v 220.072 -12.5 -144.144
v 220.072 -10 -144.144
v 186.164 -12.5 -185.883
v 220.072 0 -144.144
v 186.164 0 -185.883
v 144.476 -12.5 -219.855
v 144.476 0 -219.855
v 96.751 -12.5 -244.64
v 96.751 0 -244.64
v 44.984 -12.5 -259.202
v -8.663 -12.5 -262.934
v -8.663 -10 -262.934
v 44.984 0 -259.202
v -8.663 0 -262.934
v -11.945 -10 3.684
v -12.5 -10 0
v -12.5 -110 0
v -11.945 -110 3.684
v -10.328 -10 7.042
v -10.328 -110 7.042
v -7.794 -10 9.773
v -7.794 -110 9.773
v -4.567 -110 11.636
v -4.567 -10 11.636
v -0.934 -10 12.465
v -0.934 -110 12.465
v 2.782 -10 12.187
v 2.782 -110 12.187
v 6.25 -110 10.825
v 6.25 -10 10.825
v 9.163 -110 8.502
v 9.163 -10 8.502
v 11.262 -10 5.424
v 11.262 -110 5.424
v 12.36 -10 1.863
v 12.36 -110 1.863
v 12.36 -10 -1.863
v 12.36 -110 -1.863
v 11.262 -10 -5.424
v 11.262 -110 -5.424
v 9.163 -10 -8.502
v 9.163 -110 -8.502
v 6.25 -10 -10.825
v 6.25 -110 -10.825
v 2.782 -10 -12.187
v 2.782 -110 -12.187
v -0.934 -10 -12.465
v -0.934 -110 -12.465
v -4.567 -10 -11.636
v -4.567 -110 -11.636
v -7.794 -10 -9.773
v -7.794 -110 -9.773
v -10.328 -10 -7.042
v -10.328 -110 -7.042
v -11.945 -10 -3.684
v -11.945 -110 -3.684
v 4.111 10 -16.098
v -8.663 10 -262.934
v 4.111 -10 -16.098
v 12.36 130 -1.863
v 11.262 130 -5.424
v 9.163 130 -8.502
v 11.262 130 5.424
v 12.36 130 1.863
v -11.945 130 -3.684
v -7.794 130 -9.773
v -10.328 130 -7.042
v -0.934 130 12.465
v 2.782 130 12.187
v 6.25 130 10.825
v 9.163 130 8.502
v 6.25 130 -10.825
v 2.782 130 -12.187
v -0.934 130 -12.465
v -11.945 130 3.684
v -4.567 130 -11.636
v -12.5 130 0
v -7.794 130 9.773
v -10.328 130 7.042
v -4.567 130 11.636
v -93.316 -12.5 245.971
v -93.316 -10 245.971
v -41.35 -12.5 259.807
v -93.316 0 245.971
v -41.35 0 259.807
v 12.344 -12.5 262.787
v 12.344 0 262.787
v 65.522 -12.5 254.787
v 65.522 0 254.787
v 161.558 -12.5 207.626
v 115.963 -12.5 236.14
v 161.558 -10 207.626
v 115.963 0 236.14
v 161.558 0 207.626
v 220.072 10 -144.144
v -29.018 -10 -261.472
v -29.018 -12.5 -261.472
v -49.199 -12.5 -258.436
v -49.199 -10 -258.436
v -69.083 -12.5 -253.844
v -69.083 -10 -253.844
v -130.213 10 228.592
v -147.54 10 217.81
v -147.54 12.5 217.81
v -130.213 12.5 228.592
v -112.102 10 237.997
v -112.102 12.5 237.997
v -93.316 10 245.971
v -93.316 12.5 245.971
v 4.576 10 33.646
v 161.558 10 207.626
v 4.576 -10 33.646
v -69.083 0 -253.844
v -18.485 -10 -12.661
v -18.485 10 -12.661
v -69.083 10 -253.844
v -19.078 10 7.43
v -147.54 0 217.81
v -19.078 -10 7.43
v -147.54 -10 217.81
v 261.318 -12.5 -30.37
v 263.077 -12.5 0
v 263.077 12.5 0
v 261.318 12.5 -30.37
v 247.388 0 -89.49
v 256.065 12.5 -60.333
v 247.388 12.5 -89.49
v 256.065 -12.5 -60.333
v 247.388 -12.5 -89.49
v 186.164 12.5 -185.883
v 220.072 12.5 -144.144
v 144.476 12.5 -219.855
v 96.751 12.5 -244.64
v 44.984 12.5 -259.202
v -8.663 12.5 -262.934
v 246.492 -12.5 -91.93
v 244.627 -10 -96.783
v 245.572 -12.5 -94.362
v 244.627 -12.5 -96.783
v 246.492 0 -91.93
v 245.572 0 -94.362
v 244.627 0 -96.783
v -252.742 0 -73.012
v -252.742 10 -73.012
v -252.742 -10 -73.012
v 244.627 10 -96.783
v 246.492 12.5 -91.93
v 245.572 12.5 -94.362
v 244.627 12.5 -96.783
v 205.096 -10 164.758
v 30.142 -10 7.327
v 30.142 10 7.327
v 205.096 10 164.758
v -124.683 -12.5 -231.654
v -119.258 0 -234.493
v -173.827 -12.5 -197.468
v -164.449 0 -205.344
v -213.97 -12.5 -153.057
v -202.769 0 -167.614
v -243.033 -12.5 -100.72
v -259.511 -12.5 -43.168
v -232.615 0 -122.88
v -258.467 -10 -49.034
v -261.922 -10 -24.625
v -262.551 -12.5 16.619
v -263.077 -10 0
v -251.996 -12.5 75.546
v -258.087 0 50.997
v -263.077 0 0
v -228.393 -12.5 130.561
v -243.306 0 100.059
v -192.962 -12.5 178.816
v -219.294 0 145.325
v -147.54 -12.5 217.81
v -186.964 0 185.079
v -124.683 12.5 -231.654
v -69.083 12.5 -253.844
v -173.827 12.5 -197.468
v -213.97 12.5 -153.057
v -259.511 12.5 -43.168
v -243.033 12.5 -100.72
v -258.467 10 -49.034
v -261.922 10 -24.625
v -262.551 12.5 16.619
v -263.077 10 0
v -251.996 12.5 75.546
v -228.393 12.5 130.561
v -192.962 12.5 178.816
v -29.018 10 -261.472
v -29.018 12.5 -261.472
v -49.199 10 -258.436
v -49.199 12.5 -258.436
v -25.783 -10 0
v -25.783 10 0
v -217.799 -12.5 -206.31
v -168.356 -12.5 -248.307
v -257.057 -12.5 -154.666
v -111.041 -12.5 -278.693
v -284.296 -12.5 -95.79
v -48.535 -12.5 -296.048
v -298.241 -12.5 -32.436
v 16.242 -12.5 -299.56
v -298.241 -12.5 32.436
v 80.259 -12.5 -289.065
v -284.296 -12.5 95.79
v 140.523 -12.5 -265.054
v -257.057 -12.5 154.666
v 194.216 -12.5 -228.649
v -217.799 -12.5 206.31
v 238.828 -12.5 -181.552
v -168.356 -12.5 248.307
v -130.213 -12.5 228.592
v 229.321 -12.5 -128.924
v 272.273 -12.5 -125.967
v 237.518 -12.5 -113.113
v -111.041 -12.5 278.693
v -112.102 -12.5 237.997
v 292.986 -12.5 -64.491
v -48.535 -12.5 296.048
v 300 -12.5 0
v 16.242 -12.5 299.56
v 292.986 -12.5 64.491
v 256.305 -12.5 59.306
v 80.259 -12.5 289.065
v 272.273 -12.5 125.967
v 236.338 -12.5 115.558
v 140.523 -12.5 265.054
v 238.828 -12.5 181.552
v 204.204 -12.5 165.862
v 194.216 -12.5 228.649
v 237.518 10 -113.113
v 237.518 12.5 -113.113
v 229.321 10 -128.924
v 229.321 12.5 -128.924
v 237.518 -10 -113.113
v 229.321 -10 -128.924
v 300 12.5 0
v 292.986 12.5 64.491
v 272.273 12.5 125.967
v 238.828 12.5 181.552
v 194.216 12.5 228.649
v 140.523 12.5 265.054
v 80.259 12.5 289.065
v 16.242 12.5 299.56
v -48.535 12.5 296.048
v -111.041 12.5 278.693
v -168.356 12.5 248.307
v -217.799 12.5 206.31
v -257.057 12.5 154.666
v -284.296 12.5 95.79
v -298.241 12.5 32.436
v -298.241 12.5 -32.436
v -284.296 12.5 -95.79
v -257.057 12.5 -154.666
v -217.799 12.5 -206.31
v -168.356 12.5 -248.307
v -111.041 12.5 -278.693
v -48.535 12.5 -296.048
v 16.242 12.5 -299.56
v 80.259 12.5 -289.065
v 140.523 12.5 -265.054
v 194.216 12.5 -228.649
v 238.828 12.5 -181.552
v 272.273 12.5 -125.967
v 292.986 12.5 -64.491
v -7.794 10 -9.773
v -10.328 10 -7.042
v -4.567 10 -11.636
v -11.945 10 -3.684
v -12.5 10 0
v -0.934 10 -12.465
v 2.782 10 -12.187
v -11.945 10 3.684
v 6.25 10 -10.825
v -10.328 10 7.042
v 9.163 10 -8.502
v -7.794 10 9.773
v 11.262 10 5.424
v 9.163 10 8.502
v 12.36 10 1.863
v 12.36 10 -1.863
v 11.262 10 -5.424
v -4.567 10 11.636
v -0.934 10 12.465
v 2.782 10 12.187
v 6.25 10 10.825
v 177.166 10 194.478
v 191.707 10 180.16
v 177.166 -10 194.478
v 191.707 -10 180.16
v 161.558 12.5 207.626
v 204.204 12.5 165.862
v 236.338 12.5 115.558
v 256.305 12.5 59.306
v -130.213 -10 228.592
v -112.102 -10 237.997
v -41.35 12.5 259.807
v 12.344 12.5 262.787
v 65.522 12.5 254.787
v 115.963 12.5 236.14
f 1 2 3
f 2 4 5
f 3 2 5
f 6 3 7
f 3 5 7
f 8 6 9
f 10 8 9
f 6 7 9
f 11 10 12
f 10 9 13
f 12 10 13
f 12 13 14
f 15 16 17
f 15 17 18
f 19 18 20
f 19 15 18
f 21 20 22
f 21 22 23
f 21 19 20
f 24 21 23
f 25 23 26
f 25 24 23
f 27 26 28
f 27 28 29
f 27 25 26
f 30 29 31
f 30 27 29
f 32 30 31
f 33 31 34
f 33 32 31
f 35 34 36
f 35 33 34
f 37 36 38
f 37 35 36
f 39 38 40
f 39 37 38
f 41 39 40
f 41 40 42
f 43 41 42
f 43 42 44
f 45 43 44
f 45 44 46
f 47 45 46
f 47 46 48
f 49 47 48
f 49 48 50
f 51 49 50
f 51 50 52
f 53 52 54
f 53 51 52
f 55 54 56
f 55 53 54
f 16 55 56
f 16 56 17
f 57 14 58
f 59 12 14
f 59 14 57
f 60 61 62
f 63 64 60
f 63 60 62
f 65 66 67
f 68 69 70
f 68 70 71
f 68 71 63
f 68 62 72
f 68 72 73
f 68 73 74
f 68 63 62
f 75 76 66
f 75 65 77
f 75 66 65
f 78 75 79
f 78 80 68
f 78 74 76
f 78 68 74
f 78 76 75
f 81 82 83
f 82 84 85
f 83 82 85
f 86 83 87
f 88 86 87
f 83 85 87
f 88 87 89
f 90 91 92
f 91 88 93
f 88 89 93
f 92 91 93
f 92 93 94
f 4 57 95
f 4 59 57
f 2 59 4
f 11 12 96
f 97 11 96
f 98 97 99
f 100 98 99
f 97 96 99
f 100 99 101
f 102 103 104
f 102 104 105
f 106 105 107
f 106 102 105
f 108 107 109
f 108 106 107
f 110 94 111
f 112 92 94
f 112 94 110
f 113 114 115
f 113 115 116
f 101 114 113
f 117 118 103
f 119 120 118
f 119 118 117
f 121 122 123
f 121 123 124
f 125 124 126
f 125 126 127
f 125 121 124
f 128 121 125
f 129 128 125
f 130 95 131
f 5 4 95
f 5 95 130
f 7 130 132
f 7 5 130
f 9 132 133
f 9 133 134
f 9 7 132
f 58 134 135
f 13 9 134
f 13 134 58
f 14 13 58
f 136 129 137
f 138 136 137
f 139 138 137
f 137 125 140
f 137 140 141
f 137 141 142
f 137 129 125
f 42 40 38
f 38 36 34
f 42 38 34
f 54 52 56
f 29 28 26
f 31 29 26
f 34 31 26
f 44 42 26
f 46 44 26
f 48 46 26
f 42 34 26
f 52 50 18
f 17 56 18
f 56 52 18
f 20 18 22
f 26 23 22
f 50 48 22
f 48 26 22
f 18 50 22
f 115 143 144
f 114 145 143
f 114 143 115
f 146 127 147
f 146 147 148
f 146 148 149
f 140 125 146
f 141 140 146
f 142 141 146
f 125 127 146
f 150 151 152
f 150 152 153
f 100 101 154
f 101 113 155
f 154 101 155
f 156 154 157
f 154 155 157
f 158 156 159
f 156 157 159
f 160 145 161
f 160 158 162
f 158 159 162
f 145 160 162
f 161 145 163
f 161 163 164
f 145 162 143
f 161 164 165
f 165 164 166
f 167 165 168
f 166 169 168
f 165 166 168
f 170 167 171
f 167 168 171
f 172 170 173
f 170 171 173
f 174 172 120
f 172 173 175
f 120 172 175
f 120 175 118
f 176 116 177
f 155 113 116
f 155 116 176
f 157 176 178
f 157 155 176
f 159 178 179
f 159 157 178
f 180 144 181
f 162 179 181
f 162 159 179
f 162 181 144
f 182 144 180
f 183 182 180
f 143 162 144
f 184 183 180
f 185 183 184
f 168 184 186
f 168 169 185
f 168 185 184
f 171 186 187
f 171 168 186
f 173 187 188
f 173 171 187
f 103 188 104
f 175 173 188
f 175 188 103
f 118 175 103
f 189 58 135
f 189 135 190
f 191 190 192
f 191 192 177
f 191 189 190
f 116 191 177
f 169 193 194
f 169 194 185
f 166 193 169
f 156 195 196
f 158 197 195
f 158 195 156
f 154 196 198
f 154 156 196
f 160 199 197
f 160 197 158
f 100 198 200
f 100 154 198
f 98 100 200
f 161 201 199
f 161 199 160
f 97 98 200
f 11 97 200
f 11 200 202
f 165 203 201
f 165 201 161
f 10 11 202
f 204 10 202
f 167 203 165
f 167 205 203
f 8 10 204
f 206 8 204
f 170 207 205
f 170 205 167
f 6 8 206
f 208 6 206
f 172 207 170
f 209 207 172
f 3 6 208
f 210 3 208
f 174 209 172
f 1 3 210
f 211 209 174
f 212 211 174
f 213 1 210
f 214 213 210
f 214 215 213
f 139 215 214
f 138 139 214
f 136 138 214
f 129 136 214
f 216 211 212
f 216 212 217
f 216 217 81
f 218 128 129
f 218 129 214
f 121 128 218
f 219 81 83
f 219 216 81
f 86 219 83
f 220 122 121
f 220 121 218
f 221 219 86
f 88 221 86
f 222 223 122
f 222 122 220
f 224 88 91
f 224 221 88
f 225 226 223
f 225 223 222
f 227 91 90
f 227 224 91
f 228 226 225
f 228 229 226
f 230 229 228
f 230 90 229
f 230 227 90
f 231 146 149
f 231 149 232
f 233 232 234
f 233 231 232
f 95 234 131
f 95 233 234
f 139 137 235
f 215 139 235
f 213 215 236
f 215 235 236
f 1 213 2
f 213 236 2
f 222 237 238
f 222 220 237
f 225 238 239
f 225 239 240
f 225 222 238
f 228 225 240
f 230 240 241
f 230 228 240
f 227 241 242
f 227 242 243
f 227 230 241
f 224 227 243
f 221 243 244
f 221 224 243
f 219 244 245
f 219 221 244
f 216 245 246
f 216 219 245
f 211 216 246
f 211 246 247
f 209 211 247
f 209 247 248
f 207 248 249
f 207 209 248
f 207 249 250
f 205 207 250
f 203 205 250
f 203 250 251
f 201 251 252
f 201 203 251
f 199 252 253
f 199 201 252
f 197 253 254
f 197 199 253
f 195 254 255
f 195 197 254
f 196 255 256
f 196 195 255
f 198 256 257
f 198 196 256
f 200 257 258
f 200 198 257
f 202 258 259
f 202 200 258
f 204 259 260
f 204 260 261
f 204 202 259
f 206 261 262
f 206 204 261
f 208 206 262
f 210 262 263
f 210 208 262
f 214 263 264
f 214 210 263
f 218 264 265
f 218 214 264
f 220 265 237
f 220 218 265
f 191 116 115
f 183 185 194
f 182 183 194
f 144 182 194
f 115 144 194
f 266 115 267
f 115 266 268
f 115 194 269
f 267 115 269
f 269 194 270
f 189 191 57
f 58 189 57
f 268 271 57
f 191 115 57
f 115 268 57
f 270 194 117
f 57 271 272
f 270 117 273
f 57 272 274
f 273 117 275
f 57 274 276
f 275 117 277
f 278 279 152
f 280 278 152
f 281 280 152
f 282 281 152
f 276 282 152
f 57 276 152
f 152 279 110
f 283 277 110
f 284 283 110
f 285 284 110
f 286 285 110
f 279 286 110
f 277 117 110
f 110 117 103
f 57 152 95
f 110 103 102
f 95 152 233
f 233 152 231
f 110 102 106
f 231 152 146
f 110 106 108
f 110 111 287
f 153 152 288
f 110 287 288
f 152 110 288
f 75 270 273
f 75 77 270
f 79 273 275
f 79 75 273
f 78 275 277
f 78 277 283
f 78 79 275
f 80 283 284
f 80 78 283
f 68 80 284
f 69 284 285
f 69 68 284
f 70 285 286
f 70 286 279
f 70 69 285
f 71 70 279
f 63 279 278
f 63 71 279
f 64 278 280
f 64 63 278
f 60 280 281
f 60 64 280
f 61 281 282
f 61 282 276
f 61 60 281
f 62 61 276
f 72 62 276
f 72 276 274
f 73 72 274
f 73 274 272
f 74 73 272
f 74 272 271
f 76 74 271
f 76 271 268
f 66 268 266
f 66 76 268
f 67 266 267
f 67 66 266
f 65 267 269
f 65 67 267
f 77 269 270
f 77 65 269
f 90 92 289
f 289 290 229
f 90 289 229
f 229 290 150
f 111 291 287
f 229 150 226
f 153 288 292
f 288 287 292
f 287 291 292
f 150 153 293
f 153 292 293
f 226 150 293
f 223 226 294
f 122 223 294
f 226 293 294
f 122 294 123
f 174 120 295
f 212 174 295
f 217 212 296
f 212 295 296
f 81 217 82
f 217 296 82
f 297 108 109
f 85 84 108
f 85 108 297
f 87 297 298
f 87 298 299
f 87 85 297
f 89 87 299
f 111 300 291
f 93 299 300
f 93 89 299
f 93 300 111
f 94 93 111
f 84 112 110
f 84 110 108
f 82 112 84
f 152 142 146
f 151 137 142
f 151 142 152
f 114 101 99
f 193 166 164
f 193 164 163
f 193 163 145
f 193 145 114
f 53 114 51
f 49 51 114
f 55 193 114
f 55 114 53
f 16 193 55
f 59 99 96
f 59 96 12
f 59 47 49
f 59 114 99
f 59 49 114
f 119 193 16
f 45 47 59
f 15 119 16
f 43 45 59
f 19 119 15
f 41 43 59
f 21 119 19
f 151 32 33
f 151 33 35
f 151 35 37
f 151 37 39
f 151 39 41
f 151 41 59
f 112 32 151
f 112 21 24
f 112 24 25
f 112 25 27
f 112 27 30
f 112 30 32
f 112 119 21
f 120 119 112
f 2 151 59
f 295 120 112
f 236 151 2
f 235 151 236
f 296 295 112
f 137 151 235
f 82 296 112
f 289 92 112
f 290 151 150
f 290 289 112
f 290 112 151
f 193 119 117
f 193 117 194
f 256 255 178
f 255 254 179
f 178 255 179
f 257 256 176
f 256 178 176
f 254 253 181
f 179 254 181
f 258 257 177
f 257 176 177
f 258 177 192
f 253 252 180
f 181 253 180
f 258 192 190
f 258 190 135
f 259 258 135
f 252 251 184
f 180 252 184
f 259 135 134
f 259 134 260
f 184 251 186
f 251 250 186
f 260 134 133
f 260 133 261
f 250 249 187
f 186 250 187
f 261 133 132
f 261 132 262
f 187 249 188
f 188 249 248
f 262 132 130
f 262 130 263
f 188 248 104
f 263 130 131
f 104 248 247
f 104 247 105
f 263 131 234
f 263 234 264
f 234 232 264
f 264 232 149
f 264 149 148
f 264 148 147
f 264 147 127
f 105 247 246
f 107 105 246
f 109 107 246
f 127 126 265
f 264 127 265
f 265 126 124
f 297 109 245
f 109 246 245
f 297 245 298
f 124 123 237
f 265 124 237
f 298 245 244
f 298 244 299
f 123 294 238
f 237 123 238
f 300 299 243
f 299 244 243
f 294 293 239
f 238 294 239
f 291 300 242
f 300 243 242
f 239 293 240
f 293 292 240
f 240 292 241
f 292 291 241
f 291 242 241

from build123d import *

# Parameters (mm, degrees)
F0_R     = 300
F1_DEPTH = 12.5
F2_DEPTH = 10
F3_R     = 12.5
F4_DEPTH = 120


with BuildPart() as f1:
    # F0 (on Front) → F1 (new body, symmetric)
    with BuildSketch(Plane.XZ):
        Circle(F0_R)
        with BuildLine():
            ThreePointArc((205.0956009639, 164.7581922724), (248.1586056274, 87.3314027639), (263.0769230769, 0))
            ThreePointArc((263.0769230769, 0), (259.1250629437, -45.4276260667), (247.3882097841, -89.4904526497))
            Line((247.3882097841, -89.4904526497), (253.5845122853, -126.7404960598))
            Line((253.5845122853, -126.7404960598), (220.0723785431, -144.1444263855))
            ThreePointArc((220.0723785431, -144.1444263855), (121.2485164836, -233.4700509833), (-8.6633171075, -262.9342396728))
            Line((-8.6633171075, -262.9342396728), (-42.1754508497, -280.3381699985))
            Line((-42.1754508497, -280.3381699985), (-69.0833910393, -253.8443470675))
            ThreePointArc((-69.0833910393, -253.8443470675), (-184.5753612112, -187.4604051243), (-252.7424342118, -73.0118442742))
            Line((-252.7424342118, -73.0118442742), (-279.6503744013, -46.5180213432))
            Line((-279.6503744013, -46.5180213432), (-263.0769230769, 0))
            ThreePointArc((-263.0769230769, 0), (-232.4046711792, 123.2782879087), (-147.5400976348, 217.8104383301))
            Line((-147.5400976348, 217.8104383301), (-130.6579854969, 251.588451719))
            Line((-130.6579854969, 251.588451719), (-93.3163262043, 245.9705891349))
            ThreePointArc((-93.3163262043, 245.9705891349), (39.138142442, 260.1493287745), (161.55763917, 207.6260982667))
            Line((161.55763917, 207.6260982667), (198.8992984626, 202.0082356825))
            Line((198.8992984626, 202.0082356825), (205.0956009639, 164.7581922724))
        make_face(mode=Mode.SUBTRACT)
        with BuildLine():
            ThreePointArc((-147.5400976348, 217.8104383301), (-121.2485164836, 233.4700509833), (-93.3163262043, 245.9705891349))
            Line((-93.3163262043, 245.9705891349), (-130.6579854969, 251.588451719))
            Line((-130.6579854969, 251.588451719), (-147.5400976348, 217.8104383301))
        make_face()
        with BuildLine():
            ThreePointArc((-252.7424342118, -73.0118442742), (-260.4804881167, -36.8698083275), (-263.0769230769, 0))
            Line((-263.0769230769, 0), (-279.6503744013, -46.5180213432))
            Line((-279.6503744013, -46.5180213432), (-252.7424342118, -73.0118442742))
        make_face()
        with BuildLine():
            Line((-42.1754508497, -280.3381699985), (-8.6633171075, -262.9342396728))
            ThreePointArc((-8.6633171075, -262.9342396728), (-39.138142442, -260.1493287745), (-69.0833910393, -253.8443470675))
            Line((-69.0833910393, -253.8443470675), (-42.1754508497, -280.3381699985))
        make_face()
        with BuildLine():
            Line((253.5845122853, -126.7404960598), (247.3882097841, -89.4904526497))
            ThreePointArc((247.3882097841, -89.4904526497), (246.0347091348, -93.1471382093), (244.6271617936, -96.7833620434))
            ThreePointArc((244.6271617936, -96.7833620434), (233.553384264, -121.0879191102), (220.0723785431, -144.1444263855))
            Line((220.0723785431, -144.1444263855), (253.5845122853, -126.7404960598))
        make_face()
        with BuildLine():
            ThreePointArc((161.55763917, 207.6260982667), (184.5753612112, 187.4604051243), (205.0956009639, 164.7581922724))
            Line((205.0956009639, 164.7581922724), (198.8992984626, 202.0082356825))
            Line((198.8992984626, 202.0082356825), (161.55763917, 207.6260982667))
        make_face()
    extrude(amount=F1_DEPTH, both=True)

    # F0 (on Front) → F2 (join, symmetric)
    with BuildSketch(Plane.XZ):
        with BuildLine():
            Line((244.6271617936, -96.7833620434), (30.1419629049, 7.3265620085))
            Line((30.1419629049, 7.3265620085), (12.8380831788, 15.7257691026))
            Line((12.8380831788, 15.7257691026), (4.5759868907, 33.6459373179))
            Line((4.5759868907, 33.6459373179), (-93.3163262043, 245.9705891349))
            ThreePointArc((-93.3163262043, 245.9705891349), (-121.2485164836, 233.4700509833), (-147.5400976348, 217.8104383301))
            Line((-147.5400976348, 217.8104383301), (-19.0782173139, 7.4303752131))
            Line((-19.0782173139, 7.4303752131), (-25.7826172389, 0))
            Line((-25.7826172389, 0), (-263.0769230769, 0))
            ThreePointArc((-263.0769230769, 0), (-260.4804881167, -36.8698083275), (-252.7424342118, -73.0118442742))
            Line((-252.7424342118, -73.0118442742), (-18.4854909648, -12.6607832838))
            Line((-18.4854909649, -12.6607832838), (-69.0833910393, -253.8443470675))
            ThreePointArc((-69.0833910393, -253.8443470675), (-39.138142442, -260.1493287745), (-8.6633171075, -262.9342396728))
            Line((-8.6633171075, -262.9342396728), (4.1106084022, -16.0976926844))
            Line((4.1106084022, -16.0976926844), (220.0723785431, -144.1444263855))
            ThreePointArc((220.0723785431, -144.1444263855), (233.553384264, -121.0879191102), (244.6271617936, -96.7833620434))
        make_face()
        with BuildLine():
            Line((30.1419629049, 7.3265620085), (205.0956009639, 164.7581922724))
            ThreePointArc((205.0956009639, 164.7581922724), (184.5753612112, 187.4604051243), (161.55763917, 207.6260982667))
            Line((161.55763917, 207.6260982667), (4.5759868907, 33.6459373179))
            Line((4.5759868907, 33.6459373179), (12.8380831788, 15.7257691026))
            Line((12.8380831788, 15.7257691026), (30.1419629049, 7.3265620085))
        make_face()
    extrude(amount=F2_DEPTH, both=True)

    # F3 (on face) → F4 (join, symmetric)
    with BuildSketch(Plane(origin=(0, 10, 0), x_dir=(-1, 0, 0), z_dir=(0, 1, 0))):
        Circle(F3_R)
    extrude(amount=F4_DEPTH, both=True)


solid = f1.part
